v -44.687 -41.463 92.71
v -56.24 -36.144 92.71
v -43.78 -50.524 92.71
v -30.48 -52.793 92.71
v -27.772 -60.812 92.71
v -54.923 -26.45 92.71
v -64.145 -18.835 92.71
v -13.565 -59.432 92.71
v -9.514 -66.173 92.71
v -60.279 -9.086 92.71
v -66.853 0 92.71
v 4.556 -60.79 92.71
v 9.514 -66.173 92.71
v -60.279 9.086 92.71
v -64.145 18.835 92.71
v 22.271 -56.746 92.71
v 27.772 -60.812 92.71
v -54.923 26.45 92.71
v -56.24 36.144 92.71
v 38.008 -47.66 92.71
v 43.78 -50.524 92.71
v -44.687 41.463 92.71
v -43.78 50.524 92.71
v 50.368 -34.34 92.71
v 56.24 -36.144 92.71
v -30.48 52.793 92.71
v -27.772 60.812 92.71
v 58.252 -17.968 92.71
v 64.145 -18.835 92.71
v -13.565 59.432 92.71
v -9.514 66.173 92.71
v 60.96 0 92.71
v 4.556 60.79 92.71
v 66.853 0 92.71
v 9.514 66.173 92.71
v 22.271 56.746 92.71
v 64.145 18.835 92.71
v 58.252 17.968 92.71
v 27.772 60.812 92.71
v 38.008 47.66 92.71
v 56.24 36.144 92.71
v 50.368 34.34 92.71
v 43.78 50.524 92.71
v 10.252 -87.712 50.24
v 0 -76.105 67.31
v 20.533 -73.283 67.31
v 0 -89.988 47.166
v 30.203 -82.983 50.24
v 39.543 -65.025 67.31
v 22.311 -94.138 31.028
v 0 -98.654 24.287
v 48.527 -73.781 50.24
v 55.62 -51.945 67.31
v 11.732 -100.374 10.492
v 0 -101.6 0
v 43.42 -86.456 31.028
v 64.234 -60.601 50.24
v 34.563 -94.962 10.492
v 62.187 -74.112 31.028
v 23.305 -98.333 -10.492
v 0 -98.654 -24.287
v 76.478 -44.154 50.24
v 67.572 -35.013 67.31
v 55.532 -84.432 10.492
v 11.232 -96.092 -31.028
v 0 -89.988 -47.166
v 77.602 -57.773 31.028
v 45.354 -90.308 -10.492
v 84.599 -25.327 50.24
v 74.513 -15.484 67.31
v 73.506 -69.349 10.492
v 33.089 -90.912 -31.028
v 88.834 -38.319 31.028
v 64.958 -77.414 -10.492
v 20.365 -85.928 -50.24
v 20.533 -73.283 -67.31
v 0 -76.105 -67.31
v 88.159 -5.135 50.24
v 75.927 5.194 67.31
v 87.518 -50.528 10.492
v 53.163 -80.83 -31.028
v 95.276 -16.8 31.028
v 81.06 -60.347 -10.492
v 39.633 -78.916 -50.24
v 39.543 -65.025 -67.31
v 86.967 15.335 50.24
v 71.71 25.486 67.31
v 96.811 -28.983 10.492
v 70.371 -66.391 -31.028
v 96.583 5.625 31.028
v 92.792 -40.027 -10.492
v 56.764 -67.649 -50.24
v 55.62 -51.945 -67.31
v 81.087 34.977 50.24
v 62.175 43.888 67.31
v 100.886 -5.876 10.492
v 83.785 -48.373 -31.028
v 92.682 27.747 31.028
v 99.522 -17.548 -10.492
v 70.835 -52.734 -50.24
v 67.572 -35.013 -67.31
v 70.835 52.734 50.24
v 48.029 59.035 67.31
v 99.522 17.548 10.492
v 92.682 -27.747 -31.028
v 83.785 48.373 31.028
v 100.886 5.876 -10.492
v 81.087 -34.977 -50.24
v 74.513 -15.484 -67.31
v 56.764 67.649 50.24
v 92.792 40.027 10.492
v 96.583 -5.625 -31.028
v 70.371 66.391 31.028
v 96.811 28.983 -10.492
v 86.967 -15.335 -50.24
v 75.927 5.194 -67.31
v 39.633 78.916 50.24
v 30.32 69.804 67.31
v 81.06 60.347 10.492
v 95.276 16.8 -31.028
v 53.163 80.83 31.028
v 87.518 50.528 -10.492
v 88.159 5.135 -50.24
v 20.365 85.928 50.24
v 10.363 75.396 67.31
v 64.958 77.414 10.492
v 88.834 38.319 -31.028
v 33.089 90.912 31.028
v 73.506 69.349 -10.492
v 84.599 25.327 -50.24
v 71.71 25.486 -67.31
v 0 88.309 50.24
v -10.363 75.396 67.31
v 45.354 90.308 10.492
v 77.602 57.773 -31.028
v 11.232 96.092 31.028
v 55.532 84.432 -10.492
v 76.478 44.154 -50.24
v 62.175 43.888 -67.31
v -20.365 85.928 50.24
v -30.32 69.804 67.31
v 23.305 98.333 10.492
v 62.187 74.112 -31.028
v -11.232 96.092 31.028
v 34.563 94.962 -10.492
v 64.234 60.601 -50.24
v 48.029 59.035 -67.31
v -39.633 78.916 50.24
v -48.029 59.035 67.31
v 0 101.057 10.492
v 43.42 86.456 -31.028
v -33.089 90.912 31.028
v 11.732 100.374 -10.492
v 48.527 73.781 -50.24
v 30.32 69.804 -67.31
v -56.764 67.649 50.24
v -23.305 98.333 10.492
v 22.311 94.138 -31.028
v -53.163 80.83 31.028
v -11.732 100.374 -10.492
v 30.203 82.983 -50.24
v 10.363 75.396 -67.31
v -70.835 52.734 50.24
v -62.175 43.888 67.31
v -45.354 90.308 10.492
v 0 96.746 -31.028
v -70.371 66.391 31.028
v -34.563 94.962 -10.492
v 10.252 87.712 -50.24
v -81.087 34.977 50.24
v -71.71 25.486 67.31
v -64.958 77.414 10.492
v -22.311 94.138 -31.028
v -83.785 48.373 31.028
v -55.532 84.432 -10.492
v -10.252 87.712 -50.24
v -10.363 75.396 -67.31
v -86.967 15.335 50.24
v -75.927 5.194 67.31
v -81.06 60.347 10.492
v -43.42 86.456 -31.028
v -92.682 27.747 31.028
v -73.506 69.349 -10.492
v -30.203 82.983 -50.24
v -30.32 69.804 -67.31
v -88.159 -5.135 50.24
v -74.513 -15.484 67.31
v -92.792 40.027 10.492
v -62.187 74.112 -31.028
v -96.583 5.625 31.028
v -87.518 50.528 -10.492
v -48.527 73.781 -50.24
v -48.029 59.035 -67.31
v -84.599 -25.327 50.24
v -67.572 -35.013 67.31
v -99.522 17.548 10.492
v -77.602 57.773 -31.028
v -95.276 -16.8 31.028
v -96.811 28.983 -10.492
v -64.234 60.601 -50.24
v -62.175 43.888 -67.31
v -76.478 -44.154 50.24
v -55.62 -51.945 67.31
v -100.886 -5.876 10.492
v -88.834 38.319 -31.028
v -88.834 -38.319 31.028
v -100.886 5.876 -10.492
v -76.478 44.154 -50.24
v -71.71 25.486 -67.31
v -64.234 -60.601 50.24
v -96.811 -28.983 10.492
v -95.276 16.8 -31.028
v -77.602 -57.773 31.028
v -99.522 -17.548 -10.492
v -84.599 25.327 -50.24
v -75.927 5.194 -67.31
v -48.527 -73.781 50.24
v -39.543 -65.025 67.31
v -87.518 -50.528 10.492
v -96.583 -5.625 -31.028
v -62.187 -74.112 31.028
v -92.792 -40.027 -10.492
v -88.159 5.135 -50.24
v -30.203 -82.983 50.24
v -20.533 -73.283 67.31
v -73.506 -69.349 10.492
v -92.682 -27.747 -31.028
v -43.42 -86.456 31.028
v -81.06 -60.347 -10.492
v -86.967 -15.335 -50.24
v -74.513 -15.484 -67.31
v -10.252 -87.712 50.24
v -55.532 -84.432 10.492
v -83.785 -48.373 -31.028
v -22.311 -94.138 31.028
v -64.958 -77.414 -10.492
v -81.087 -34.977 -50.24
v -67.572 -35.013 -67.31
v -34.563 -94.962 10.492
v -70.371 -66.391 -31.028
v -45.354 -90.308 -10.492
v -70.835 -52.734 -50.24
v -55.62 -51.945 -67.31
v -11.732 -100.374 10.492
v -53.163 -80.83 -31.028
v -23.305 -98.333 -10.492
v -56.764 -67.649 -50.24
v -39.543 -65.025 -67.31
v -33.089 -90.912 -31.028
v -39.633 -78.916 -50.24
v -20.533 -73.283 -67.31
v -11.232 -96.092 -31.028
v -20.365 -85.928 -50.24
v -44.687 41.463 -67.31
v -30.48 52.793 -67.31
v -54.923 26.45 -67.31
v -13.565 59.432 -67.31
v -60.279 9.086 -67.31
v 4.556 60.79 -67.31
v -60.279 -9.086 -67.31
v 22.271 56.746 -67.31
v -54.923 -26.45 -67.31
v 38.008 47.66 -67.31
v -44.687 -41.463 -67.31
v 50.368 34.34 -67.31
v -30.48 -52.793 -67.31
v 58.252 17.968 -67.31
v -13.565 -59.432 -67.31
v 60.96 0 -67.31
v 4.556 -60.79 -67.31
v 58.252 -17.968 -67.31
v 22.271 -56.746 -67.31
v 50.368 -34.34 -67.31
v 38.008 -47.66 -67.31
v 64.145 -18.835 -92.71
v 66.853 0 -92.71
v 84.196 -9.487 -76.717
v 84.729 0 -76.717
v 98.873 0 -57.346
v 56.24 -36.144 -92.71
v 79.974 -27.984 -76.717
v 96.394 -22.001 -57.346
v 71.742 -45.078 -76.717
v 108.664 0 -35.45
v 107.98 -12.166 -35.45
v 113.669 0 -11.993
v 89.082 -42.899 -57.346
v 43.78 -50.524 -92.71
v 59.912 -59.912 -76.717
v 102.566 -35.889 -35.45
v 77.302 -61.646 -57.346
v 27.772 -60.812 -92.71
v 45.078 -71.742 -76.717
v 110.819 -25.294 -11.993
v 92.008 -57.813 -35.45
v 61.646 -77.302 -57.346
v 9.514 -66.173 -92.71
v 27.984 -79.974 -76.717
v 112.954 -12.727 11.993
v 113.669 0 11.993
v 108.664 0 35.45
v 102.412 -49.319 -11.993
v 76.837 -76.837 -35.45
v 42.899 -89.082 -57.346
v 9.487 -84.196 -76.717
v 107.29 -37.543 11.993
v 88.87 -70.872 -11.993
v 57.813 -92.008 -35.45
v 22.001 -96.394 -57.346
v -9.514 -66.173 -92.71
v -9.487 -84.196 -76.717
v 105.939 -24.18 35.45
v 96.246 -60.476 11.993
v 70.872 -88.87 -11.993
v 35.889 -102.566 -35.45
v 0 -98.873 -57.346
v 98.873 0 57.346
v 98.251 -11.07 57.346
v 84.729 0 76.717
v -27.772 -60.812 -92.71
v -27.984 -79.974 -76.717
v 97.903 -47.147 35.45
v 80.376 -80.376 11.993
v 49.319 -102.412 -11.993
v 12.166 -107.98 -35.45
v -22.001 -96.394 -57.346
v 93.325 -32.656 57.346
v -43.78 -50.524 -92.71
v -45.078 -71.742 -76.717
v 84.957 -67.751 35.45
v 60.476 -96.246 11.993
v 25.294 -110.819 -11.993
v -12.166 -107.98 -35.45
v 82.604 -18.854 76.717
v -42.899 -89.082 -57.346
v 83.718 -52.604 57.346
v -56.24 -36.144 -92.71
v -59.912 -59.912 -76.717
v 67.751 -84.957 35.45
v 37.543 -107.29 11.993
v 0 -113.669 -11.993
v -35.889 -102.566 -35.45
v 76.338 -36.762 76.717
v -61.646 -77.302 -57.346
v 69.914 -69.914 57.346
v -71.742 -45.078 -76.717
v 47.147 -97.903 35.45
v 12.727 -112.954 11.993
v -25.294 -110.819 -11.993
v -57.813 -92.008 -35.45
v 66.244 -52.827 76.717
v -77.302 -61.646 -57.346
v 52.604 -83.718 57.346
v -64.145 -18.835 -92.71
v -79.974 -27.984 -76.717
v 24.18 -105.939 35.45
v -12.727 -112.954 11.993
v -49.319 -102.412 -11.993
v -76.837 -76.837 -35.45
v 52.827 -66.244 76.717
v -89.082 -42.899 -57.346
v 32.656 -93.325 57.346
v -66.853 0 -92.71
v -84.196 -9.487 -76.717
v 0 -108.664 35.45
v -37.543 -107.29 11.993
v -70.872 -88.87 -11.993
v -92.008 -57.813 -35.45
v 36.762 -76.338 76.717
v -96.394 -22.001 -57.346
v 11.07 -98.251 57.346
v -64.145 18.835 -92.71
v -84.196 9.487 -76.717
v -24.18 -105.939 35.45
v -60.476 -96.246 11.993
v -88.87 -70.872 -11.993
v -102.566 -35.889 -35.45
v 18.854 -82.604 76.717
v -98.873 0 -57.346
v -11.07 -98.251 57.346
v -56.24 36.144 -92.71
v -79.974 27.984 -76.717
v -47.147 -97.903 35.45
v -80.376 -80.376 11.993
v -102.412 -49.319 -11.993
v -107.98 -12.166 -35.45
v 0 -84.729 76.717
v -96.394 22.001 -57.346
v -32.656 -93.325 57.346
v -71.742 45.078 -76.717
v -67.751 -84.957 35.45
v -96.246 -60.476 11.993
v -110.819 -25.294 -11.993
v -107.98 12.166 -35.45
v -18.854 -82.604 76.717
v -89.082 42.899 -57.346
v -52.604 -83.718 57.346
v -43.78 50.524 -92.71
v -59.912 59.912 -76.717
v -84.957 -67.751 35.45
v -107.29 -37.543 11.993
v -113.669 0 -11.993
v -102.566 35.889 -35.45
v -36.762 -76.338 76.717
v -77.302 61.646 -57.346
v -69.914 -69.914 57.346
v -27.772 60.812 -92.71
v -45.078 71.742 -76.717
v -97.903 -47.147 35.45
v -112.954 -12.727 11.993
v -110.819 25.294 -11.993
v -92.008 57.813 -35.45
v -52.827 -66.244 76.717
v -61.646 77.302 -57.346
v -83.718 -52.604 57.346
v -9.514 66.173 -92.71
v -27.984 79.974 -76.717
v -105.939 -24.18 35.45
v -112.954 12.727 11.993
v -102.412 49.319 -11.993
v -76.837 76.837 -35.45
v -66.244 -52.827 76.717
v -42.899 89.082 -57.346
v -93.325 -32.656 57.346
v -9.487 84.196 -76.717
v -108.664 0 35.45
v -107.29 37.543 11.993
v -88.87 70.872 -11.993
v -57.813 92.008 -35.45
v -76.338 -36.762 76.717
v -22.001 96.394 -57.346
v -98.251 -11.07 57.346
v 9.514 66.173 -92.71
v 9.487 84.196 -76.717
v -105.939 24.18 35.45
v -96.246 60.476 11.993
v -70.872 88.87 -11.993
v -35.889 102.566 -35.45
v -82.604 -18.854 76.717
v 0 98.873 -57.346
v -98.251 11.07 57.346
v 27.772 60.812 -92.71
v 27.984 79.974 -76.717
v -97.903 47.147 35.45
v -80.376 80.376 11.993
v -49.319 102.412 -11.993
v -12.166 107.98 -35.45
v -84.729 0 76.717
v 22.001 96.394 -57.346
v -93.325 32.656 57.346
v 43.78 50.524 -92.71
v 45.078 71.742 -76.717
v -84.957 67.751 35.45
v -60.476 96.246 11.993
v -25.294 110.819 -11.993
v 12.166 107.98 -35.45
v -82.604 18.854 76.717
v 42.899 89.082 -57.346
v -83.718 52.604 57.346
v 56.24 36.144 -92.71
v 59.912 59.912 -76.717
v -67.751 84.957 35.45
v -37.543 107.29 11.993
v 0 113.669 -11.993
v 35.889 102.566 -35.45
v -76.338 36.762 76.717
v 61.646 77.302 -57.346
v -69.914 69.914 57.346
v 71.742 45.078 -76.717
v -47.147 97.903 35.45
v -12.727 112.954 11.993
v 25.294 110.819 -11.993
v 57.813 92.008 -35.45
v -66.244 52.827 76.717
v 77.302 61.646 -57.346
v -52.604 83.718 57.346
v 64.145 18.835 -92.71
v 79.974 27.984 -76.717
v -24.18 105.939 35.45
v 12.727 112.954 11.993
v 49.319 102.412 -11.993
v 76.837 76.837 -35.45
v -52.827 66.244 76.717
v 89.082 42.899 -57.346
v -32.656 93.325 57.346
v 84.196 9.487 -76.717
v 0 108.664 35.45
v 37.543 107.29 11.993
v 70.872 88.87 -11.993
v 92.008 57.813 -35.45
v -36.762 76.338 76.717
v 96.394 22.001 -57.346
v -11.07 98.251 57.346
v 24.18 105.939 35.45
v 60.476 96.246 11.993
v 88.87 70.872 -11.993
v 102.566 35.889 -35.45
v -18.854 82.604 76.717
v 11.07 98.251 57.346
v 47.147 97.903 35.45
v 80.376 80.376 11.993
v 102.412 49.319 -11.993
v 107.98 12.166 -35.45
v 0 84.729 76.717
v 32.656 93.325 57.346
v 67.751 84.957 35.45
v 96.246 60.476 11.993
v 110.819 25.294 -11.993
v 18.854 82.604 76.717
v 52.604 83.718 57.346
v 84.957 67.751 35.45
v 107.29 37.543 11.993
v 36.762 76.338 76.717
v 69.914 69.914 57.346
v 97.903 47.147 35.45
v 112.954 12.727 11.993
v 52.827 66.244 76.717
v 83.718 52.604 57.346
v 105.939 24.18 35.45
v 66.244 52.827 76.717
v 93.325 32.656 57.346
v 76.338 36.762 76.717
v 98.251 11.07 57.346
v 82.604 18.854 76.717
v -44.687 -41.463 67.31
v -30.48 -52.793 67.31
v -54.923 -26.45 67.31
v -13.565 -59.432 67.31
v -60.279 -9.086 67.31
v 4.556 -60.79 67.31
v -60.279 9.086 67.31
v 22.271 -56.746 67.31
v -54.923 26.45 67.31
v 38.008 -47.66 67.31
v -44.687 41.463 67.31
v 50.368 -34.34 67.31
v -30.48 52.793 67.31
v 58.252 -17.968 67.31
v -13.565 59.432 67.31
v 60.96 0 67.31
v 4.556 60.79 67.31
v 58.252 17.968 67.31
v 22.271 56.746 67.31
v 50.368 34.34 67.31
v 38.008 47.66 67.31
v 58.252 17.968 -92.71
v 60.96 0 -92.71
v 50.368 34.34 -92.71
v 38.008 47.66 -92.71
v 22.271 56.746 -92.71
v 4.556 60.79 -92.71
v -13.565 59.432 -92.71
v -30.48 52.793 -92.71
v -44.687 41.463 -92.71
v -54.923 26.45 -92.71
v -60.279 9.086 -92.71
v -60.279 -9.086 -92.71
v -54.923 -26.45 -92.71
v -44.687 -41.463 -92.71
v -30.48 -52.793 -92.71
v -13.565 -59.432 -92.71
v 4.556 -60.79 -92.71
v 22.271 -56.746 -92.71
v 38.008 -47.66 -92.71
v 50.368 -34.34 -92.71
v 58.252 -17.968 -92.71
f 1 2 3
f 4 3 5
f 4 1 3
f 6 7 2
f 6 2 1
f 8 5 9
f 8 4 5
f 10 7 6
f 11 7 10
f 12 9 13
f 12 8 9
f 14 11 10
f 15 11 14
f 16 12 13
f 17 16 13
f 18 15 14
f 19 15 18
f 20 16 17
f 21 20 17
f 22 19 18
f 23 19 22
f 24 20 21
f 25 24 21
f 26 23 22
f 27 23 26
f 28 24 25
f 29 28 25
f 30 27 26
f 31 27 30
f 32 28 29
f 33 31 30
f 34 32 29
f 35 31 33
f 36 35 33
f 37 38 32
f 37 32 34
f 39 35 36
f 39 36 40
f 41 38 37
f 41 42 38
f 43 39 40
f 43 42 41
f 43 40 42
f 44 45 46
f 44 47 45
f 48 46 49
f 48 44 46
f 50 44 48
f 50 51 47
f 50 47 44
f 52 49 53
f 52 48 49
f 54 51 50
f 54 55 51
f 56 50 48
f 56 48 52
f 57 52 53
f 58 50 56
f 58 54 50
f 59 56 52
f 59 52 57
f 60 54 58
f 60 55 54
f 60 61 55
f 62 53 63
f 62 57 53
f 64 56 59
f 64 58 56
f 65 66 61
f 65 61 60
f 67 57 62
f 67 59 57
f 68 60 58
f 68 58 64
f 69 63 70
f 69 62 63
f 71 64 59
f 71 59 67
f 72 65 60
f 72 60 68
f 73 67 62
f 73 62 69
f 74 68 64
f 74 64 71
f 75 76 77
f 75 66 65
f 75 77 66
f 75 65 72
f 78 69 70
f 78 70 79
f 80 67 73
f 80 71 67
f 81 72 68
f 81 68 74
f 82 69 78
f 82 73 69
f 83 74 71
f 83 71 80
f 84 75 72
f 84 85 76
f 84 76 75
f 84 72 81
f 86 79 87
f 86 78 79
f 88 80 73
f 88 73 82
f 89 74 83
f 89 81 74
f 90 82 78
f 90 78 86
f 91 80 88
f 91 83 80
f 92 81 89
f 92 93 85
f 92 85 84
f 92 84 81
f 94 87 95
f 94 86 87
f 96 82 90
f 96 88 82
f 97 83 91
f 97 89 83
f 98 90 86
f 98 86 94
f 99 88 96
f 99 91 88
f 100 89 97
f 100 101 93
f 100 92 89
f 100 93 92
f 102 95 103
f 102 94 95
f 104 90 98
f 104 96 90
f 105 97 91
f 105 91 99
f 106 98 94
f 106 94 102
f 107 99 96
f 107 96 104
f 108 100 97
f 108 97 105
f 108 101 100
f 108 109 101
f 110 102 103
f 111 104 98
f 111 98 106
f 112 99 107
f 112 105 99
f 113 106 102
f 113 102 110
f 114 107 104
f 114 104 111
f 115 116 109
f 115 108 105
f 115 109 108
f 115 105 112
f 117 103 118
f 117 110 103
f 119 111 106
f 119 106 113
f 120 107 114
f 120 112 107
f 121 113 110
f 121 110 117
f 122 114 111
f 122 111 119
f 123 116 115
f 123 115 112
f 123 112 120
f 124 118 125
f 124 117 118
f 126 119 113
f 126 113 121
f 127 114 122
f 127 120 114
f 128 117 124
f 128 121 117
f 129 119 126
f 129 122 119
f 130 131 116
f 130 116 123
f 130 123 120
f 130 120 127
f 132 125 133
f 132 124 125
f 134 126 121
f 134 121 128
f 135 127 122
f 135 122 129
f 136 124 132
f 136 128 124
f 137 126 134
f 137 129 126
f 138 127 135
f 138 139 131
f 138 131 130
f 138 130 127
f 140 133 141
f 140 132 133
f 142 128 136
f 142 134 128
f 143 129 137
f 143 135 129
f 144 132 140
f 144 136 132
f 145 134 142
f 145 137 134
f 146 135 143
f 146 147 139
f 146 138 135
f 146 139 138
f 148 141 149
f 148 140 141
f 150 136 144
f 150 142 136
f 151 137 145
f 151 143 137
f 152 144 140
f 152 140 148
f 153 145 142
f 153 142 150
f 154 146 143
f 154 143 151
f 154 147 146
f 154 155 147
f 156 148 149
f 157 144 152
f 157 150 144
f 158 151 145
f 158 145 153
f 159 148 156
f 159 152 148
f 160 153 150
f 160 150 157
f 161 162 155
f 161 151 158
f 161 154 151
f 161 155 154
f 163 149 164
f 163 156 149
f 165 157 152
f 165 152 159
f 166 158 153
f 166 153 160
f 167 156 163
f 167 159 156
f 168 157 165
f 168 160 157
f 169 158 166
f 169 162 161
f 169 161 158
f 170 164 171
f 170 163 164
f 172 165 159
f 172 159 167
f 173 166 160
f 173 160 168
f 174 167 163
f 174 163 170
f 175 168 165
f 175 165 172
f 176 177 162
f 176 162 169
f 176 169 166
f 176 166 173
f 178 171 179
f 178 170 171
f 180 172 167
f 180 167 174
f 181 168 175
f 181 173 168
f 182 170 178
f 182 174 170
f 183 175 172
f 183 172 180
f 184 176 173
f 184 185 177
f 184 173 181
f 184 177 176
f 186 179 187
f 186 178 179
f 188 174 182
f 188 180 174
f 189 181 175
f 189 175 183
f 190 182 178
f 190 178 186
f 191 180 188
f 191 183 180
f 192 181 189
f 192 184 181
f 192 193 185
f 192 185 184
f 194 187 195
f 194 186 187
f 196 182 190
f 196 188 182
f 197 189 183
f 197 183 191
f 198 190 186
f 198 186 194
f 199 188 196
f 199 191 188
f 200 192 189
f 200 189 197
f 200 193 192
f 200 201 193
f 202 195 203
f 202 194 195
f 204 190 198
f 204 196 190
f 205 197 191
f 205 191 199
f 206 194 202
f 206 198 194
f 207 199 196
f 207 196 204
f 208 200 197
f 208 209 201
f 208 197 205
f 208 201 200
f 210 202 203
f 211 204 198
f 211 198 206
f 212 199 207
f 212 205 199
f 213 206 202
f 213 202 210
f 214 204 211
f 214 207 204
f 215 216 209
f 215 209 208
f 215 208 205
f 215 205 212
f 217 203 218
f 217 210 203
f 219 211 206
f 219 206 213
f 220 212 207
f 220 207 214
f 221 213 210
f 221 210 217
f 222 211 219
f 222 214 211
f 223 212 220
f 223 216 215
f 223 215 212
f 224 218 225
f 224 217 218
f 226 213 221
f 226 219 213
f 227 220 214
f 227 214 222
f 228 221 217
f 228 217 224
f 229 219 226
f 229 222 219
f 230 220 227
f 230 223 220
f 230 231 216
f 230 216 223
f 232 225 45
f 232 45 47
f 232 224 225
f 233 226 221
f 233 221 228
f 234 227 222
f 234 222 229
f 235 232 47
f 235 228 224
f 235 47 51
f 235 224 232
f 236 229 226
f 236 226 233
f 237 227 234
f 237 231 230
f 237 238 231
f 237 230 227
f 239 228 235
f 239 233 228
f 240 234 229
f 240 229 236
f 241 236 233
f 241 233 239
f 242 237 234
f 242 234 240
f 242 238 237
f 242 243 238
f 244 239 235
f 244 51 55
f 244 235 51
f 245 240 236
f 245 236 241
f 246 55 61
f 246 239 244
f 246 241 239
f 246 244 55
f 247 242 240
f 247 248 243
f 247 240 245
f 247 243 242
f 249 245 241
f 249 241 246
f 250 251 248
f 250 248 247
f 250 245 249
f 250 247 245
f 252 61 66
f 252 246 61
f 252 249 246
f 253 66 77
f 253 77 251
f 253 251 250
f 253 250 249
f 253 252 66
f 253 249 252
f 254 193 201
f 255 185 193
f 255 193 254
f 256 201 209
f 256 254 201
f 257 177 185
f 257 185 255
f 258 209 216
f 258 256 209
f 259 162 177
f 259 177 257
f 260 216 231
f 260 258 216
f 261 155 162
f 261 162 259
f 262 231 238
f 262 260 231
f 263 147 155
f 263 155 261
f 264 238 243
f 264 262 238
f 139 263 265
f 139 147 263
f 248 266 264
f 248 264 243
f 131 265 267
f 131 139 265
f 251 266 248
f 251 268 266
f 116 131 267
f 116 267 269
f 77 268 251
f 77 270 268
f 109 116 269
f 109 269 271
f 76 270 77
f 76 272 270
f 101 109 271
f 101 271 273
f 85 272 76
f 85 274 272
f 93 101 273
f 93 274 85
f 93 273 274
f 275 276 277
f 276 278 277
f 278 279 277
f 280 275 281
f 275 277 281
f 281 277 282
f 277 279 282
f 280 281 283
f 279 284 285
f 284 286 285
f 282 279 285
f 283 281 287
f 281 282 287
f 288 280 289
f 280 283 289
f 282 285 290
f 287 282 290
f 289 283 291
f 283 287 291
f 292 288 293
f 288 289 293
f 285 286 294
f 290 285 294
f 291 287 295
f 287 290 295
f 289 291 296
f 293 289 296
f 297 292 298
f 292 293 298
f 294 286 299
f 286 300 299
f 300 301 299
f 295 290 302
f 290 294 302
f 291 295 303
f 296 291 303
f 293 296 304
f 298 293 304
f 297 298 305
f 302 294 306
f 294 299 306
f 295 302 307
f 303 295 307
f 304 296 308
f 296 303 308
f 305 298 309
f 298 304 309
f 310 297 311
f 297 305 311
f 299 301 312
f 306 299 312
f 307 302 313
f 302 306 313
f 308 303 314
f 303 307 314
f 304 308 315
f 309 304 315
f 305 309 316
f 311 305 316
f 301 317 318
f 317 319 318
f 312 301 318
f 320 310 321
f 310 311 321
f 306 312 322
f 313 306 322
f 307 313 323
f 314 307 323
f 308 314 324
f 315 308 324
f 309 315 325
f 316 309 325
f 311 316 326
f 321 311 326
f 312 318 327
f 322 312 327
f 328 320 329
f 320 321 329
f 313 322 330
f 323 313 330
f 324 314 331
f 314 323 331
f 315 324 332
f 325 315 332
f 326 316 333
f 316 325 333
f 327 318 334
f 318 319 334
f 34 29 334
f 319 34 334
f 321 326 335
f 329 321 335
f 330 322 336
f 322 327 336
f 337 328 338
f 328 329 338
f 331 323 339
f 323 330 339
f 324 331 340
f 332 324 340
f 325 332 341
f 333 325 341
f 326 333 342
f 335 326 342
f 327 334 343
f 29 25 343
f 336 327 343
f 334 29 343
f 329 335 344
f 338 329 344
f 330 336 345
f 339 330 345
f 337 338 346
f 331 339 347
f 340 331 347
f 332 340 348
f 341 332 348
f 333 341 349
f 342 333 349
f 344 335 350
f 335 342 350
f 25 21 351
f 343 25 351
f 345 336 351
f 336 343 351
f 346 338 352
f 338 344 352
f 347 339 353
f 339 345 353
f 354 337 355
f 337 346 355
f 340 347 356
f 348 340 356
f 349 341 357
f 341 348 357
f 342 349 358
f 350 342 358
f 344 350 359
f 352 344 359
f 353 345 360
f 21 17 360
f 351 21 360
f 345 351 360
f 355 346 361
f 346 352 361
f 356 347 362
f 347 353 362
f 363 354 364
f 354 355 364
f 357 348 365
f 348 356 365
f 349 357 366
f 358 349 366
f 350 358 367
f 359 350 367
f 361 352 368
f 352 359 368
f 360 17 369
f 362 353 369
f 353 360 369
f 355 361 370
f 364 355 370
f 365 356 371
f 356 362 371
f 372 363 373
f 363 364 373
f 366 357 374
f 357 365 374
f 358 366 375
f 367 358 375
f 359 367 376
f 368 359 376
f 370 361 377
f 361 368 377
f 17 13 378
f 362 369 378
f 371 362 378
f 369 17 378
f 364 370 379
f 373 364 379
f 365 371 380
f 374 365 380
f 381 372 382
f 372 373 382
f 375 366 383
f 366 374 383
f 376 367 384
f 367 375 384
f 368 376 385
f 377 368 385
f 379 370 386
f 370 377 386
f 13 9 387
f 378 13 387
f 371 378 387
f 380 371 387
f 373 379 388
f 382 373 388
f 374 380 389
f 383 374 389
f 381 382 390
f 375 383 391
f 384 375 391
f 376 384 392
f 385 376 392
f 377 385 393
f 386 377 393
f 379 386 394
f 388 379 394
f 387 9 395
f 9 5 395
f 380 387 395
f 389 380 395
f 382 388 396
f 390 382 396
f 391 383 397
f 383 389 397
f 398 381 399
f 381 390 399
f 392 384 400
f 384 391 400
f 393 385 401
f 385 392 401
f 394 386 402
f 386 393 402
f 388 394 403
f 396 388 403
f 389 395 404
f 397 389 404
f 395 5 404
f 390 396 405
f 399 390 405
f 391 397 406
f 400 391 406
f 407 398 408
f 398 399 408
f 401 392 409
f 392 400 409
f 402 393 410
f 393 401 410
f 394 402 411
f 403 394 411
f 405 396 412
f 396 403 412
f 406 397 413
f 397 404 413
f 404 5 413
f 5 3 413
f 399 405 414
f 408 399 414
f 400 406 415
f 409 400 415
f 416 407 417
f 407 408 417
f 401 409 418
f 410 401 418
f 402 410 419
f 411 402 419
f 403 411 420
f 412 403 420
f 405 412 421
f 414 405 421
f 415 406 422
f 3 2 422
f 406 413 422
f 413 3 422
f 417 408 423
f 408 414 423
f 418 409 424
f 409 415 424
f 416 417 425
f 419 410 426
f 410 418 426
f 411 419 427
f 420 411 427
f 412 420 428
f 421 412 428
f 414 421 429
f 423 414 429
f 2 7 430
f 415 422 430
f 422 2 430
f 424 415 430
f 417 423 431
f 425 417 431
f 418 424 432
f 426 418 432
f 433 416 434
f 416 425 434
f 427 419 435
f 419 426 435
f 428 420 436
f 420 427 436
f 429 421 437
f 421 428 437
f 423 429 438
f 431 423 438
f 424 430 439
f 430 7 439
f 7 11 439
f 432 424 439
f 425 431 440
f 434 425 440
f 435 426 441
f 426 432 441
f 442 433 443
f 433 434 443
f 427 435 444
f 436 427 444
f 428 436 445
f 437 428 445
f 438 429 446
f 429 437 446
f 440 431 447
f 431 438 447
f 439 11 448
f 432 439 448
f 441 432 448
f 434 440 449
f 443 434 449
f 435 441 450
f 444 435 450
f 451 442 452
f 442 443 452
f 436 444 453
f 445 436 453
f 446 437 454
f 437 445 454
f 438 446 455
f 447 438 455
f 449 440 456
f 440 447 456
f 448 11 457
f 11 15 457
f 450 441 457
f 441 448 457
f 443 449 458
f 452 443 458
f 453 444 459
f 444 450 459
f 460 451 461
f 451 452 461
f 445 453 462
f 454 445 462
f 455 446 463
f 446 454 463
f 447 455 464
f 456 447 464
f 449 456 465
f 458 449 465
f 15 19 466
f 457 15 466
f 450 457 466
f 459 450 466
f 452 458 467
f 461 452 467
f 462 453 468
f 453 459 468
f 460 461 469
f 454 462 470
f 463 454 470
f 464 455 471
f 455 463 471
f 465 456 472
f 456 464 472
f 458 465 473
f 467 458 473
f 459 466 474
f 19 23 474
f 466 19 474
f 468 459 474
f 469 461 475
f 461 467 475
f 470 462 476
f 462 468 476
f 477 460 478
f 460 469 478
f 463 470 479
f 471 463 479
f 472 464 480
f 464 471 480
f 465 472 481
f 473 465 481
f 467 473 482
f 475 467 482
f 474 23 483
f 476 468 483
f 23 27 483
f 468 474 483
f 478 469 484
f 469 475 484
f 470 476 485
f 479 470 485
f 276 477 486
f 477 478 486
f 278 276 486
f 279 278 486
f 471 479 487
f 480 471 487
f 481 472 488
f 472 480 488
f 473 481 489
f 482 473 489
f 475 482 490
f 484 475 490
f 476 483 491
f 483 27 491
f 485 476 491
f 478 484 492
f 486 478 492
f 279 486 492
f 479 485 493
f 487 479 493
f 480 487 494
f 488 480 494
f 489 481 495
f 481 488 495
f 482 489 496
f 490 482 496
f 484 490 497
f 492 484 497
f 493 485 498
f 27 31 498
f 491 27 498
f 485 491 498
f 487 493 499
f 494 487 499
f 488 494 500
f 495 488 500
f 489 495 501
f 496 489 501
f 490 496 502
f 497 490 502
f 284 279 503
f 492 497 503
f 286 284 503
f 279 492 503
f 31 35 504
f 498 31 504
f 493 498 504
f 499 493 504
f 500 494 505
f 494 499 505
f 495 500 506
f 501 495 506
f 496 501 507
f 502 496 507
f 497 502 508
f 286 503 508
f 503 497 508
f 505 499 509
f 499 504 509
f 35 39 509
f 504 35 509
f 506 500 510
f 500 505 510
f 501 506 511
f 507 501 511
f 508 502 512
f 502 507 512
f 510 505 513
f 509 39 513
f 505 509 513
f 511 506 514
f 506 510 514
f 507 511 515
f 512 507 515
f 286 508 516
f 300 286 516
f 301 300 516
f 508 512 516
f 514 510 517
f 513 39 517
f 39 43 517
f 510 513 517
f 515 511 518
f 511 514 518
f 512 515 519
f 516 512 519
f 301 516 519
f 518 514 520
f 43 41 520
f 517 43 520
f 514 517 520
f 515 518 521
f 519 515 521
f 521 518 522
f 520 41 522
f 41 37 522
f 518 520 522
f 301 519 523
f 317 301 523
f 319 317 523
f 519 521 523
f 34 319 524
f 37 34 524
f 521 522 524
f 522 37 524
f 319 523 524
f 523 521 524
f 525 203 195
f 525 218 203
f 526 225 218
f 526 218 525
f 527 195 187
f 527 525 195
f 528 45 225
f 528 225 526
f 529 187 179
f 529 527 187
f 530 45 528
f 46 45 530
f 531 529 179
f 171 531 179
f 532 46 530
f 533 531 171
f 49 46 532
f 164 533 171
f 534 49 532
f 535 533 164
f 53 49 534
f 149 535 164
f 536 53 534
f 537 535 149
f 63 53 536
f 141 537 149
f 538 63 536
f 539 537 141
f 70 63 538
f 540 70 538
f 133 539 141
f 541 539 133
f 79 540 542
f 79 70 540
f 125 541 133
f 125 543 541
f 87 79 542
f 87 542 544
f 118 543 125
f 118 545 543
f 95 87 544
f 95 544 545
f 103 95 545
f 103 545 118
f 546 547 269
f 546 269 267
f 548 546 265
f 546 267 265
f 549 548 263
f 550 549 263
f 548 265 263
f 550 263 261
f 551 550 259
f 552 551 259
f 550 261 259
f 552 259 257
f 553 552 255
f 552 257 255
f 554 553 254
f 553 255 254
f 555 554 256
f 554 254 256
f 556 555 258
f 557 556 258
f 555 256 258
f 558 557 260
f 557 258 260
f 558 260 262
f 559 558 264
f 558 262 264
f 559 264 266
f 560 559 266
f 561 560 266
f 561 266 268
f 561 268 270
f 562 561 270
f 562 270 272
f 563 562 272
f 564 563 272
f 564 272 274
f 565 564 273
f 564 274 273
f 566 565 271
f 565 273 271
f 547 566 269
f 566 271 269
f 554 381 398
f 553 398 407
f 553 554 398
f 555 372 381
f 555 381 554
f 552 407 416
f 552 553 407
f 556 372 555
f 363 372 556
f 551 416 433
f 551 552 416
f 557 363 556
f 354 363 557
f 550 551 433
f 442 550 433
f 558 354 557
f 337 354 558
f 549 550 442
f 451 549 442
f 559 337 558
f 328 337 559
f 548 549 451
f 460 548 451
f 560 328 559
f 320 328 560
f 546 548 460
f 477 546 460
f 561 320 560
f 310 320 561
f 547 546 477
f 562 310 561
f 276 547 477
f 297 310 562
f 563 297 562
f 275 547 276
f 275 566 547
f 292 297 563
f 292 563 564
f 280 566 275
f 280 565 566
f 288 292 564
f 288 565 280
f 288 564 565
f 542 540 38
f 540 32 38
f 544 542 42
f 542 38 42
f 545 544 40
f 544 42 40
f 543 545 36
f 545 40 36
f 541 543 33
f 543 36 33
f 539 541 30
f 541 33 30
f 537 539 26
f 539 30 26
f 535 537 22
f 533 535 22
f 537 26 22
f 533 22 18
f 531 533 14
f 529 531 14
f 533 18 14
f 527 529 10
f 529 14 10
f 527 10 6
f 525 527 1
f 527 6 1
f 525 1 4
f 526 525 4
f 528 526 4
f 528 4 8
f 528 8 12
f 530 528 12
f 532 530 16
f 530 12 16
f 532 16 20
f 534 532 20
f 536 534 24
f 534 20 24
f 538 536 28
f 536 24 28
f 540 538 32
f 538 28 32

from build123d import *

# Parameters (mm, degrees)
F2_R          = 60.96
F3_DEPTH      = 114.301
F3_DEPTH_BACK = 114.301
F4_W          = 259.588
F4_H          = 37.084
F5_DEPTH      = 114.301
F5_DEPTH_BACK = 114.301


with BuildPart() as f1:
    # F0 (on Front) → F1 (revolve)
    with BuildSketch(Plane.XZ):
        with BuildLine():
            Line((0, 114.3), (0, -114.3))
            ThreePointArc((0, -114.3), (114.3, 0), (0, 114.3))
        make_face()
    revolve(axis=Axis((0, 0, 0), (0, 0, -1)))

    # F2 (on Top) → F3 (cut, two sides)
    with BuildSketch(Plane.XY) as f3_sk:
        Circle(F2_R)
    extrude(amount=-F3_DEPTH, mode=Mode.SUBTRACT)
    extrude(f3_sk.sketch, amount=F3_DEPTH_BACK, mode=Mode.SUBTRACT)

    # F4 (on Front) → F5 (cut, two sides)
    with BuildSketch(Plane.XZ) as f5_sk:
        with Locations((0, 111.252)):
            Rectangle(F4_W, F4_H)
        with Locations((0, -111.252)):
            Rectangle(F4_W, F4_H)
    extrude(amount=-F5_DEPTH, mode=Mode.SUBTRACT)
    extrude(f5_sk.sketch, amount=F5_DEPTH_BACK, mode=Mode.SUBTRACT)

    # F6 (on Right) → F7 (revolve, cut)
    with BuildSketch(Plane.YZ):
        with BuildLine():
            Line((0, 67.31), (-76.1046903942, 67.31))
            ThreePointArc((-76.1046903942, 67.31), (-101.6, 0), (-76.1046903942, -67.31))
            Line((-76.1046903942, -67.31), (0, -67.31))
            Line((0, -67.31), (0, 67.31))
        make_face()
    revolve(axis=Axis((0, 0, 0), (0, 0, 1)), mode=Mode.SUBTRACT)


solid = f1.part
